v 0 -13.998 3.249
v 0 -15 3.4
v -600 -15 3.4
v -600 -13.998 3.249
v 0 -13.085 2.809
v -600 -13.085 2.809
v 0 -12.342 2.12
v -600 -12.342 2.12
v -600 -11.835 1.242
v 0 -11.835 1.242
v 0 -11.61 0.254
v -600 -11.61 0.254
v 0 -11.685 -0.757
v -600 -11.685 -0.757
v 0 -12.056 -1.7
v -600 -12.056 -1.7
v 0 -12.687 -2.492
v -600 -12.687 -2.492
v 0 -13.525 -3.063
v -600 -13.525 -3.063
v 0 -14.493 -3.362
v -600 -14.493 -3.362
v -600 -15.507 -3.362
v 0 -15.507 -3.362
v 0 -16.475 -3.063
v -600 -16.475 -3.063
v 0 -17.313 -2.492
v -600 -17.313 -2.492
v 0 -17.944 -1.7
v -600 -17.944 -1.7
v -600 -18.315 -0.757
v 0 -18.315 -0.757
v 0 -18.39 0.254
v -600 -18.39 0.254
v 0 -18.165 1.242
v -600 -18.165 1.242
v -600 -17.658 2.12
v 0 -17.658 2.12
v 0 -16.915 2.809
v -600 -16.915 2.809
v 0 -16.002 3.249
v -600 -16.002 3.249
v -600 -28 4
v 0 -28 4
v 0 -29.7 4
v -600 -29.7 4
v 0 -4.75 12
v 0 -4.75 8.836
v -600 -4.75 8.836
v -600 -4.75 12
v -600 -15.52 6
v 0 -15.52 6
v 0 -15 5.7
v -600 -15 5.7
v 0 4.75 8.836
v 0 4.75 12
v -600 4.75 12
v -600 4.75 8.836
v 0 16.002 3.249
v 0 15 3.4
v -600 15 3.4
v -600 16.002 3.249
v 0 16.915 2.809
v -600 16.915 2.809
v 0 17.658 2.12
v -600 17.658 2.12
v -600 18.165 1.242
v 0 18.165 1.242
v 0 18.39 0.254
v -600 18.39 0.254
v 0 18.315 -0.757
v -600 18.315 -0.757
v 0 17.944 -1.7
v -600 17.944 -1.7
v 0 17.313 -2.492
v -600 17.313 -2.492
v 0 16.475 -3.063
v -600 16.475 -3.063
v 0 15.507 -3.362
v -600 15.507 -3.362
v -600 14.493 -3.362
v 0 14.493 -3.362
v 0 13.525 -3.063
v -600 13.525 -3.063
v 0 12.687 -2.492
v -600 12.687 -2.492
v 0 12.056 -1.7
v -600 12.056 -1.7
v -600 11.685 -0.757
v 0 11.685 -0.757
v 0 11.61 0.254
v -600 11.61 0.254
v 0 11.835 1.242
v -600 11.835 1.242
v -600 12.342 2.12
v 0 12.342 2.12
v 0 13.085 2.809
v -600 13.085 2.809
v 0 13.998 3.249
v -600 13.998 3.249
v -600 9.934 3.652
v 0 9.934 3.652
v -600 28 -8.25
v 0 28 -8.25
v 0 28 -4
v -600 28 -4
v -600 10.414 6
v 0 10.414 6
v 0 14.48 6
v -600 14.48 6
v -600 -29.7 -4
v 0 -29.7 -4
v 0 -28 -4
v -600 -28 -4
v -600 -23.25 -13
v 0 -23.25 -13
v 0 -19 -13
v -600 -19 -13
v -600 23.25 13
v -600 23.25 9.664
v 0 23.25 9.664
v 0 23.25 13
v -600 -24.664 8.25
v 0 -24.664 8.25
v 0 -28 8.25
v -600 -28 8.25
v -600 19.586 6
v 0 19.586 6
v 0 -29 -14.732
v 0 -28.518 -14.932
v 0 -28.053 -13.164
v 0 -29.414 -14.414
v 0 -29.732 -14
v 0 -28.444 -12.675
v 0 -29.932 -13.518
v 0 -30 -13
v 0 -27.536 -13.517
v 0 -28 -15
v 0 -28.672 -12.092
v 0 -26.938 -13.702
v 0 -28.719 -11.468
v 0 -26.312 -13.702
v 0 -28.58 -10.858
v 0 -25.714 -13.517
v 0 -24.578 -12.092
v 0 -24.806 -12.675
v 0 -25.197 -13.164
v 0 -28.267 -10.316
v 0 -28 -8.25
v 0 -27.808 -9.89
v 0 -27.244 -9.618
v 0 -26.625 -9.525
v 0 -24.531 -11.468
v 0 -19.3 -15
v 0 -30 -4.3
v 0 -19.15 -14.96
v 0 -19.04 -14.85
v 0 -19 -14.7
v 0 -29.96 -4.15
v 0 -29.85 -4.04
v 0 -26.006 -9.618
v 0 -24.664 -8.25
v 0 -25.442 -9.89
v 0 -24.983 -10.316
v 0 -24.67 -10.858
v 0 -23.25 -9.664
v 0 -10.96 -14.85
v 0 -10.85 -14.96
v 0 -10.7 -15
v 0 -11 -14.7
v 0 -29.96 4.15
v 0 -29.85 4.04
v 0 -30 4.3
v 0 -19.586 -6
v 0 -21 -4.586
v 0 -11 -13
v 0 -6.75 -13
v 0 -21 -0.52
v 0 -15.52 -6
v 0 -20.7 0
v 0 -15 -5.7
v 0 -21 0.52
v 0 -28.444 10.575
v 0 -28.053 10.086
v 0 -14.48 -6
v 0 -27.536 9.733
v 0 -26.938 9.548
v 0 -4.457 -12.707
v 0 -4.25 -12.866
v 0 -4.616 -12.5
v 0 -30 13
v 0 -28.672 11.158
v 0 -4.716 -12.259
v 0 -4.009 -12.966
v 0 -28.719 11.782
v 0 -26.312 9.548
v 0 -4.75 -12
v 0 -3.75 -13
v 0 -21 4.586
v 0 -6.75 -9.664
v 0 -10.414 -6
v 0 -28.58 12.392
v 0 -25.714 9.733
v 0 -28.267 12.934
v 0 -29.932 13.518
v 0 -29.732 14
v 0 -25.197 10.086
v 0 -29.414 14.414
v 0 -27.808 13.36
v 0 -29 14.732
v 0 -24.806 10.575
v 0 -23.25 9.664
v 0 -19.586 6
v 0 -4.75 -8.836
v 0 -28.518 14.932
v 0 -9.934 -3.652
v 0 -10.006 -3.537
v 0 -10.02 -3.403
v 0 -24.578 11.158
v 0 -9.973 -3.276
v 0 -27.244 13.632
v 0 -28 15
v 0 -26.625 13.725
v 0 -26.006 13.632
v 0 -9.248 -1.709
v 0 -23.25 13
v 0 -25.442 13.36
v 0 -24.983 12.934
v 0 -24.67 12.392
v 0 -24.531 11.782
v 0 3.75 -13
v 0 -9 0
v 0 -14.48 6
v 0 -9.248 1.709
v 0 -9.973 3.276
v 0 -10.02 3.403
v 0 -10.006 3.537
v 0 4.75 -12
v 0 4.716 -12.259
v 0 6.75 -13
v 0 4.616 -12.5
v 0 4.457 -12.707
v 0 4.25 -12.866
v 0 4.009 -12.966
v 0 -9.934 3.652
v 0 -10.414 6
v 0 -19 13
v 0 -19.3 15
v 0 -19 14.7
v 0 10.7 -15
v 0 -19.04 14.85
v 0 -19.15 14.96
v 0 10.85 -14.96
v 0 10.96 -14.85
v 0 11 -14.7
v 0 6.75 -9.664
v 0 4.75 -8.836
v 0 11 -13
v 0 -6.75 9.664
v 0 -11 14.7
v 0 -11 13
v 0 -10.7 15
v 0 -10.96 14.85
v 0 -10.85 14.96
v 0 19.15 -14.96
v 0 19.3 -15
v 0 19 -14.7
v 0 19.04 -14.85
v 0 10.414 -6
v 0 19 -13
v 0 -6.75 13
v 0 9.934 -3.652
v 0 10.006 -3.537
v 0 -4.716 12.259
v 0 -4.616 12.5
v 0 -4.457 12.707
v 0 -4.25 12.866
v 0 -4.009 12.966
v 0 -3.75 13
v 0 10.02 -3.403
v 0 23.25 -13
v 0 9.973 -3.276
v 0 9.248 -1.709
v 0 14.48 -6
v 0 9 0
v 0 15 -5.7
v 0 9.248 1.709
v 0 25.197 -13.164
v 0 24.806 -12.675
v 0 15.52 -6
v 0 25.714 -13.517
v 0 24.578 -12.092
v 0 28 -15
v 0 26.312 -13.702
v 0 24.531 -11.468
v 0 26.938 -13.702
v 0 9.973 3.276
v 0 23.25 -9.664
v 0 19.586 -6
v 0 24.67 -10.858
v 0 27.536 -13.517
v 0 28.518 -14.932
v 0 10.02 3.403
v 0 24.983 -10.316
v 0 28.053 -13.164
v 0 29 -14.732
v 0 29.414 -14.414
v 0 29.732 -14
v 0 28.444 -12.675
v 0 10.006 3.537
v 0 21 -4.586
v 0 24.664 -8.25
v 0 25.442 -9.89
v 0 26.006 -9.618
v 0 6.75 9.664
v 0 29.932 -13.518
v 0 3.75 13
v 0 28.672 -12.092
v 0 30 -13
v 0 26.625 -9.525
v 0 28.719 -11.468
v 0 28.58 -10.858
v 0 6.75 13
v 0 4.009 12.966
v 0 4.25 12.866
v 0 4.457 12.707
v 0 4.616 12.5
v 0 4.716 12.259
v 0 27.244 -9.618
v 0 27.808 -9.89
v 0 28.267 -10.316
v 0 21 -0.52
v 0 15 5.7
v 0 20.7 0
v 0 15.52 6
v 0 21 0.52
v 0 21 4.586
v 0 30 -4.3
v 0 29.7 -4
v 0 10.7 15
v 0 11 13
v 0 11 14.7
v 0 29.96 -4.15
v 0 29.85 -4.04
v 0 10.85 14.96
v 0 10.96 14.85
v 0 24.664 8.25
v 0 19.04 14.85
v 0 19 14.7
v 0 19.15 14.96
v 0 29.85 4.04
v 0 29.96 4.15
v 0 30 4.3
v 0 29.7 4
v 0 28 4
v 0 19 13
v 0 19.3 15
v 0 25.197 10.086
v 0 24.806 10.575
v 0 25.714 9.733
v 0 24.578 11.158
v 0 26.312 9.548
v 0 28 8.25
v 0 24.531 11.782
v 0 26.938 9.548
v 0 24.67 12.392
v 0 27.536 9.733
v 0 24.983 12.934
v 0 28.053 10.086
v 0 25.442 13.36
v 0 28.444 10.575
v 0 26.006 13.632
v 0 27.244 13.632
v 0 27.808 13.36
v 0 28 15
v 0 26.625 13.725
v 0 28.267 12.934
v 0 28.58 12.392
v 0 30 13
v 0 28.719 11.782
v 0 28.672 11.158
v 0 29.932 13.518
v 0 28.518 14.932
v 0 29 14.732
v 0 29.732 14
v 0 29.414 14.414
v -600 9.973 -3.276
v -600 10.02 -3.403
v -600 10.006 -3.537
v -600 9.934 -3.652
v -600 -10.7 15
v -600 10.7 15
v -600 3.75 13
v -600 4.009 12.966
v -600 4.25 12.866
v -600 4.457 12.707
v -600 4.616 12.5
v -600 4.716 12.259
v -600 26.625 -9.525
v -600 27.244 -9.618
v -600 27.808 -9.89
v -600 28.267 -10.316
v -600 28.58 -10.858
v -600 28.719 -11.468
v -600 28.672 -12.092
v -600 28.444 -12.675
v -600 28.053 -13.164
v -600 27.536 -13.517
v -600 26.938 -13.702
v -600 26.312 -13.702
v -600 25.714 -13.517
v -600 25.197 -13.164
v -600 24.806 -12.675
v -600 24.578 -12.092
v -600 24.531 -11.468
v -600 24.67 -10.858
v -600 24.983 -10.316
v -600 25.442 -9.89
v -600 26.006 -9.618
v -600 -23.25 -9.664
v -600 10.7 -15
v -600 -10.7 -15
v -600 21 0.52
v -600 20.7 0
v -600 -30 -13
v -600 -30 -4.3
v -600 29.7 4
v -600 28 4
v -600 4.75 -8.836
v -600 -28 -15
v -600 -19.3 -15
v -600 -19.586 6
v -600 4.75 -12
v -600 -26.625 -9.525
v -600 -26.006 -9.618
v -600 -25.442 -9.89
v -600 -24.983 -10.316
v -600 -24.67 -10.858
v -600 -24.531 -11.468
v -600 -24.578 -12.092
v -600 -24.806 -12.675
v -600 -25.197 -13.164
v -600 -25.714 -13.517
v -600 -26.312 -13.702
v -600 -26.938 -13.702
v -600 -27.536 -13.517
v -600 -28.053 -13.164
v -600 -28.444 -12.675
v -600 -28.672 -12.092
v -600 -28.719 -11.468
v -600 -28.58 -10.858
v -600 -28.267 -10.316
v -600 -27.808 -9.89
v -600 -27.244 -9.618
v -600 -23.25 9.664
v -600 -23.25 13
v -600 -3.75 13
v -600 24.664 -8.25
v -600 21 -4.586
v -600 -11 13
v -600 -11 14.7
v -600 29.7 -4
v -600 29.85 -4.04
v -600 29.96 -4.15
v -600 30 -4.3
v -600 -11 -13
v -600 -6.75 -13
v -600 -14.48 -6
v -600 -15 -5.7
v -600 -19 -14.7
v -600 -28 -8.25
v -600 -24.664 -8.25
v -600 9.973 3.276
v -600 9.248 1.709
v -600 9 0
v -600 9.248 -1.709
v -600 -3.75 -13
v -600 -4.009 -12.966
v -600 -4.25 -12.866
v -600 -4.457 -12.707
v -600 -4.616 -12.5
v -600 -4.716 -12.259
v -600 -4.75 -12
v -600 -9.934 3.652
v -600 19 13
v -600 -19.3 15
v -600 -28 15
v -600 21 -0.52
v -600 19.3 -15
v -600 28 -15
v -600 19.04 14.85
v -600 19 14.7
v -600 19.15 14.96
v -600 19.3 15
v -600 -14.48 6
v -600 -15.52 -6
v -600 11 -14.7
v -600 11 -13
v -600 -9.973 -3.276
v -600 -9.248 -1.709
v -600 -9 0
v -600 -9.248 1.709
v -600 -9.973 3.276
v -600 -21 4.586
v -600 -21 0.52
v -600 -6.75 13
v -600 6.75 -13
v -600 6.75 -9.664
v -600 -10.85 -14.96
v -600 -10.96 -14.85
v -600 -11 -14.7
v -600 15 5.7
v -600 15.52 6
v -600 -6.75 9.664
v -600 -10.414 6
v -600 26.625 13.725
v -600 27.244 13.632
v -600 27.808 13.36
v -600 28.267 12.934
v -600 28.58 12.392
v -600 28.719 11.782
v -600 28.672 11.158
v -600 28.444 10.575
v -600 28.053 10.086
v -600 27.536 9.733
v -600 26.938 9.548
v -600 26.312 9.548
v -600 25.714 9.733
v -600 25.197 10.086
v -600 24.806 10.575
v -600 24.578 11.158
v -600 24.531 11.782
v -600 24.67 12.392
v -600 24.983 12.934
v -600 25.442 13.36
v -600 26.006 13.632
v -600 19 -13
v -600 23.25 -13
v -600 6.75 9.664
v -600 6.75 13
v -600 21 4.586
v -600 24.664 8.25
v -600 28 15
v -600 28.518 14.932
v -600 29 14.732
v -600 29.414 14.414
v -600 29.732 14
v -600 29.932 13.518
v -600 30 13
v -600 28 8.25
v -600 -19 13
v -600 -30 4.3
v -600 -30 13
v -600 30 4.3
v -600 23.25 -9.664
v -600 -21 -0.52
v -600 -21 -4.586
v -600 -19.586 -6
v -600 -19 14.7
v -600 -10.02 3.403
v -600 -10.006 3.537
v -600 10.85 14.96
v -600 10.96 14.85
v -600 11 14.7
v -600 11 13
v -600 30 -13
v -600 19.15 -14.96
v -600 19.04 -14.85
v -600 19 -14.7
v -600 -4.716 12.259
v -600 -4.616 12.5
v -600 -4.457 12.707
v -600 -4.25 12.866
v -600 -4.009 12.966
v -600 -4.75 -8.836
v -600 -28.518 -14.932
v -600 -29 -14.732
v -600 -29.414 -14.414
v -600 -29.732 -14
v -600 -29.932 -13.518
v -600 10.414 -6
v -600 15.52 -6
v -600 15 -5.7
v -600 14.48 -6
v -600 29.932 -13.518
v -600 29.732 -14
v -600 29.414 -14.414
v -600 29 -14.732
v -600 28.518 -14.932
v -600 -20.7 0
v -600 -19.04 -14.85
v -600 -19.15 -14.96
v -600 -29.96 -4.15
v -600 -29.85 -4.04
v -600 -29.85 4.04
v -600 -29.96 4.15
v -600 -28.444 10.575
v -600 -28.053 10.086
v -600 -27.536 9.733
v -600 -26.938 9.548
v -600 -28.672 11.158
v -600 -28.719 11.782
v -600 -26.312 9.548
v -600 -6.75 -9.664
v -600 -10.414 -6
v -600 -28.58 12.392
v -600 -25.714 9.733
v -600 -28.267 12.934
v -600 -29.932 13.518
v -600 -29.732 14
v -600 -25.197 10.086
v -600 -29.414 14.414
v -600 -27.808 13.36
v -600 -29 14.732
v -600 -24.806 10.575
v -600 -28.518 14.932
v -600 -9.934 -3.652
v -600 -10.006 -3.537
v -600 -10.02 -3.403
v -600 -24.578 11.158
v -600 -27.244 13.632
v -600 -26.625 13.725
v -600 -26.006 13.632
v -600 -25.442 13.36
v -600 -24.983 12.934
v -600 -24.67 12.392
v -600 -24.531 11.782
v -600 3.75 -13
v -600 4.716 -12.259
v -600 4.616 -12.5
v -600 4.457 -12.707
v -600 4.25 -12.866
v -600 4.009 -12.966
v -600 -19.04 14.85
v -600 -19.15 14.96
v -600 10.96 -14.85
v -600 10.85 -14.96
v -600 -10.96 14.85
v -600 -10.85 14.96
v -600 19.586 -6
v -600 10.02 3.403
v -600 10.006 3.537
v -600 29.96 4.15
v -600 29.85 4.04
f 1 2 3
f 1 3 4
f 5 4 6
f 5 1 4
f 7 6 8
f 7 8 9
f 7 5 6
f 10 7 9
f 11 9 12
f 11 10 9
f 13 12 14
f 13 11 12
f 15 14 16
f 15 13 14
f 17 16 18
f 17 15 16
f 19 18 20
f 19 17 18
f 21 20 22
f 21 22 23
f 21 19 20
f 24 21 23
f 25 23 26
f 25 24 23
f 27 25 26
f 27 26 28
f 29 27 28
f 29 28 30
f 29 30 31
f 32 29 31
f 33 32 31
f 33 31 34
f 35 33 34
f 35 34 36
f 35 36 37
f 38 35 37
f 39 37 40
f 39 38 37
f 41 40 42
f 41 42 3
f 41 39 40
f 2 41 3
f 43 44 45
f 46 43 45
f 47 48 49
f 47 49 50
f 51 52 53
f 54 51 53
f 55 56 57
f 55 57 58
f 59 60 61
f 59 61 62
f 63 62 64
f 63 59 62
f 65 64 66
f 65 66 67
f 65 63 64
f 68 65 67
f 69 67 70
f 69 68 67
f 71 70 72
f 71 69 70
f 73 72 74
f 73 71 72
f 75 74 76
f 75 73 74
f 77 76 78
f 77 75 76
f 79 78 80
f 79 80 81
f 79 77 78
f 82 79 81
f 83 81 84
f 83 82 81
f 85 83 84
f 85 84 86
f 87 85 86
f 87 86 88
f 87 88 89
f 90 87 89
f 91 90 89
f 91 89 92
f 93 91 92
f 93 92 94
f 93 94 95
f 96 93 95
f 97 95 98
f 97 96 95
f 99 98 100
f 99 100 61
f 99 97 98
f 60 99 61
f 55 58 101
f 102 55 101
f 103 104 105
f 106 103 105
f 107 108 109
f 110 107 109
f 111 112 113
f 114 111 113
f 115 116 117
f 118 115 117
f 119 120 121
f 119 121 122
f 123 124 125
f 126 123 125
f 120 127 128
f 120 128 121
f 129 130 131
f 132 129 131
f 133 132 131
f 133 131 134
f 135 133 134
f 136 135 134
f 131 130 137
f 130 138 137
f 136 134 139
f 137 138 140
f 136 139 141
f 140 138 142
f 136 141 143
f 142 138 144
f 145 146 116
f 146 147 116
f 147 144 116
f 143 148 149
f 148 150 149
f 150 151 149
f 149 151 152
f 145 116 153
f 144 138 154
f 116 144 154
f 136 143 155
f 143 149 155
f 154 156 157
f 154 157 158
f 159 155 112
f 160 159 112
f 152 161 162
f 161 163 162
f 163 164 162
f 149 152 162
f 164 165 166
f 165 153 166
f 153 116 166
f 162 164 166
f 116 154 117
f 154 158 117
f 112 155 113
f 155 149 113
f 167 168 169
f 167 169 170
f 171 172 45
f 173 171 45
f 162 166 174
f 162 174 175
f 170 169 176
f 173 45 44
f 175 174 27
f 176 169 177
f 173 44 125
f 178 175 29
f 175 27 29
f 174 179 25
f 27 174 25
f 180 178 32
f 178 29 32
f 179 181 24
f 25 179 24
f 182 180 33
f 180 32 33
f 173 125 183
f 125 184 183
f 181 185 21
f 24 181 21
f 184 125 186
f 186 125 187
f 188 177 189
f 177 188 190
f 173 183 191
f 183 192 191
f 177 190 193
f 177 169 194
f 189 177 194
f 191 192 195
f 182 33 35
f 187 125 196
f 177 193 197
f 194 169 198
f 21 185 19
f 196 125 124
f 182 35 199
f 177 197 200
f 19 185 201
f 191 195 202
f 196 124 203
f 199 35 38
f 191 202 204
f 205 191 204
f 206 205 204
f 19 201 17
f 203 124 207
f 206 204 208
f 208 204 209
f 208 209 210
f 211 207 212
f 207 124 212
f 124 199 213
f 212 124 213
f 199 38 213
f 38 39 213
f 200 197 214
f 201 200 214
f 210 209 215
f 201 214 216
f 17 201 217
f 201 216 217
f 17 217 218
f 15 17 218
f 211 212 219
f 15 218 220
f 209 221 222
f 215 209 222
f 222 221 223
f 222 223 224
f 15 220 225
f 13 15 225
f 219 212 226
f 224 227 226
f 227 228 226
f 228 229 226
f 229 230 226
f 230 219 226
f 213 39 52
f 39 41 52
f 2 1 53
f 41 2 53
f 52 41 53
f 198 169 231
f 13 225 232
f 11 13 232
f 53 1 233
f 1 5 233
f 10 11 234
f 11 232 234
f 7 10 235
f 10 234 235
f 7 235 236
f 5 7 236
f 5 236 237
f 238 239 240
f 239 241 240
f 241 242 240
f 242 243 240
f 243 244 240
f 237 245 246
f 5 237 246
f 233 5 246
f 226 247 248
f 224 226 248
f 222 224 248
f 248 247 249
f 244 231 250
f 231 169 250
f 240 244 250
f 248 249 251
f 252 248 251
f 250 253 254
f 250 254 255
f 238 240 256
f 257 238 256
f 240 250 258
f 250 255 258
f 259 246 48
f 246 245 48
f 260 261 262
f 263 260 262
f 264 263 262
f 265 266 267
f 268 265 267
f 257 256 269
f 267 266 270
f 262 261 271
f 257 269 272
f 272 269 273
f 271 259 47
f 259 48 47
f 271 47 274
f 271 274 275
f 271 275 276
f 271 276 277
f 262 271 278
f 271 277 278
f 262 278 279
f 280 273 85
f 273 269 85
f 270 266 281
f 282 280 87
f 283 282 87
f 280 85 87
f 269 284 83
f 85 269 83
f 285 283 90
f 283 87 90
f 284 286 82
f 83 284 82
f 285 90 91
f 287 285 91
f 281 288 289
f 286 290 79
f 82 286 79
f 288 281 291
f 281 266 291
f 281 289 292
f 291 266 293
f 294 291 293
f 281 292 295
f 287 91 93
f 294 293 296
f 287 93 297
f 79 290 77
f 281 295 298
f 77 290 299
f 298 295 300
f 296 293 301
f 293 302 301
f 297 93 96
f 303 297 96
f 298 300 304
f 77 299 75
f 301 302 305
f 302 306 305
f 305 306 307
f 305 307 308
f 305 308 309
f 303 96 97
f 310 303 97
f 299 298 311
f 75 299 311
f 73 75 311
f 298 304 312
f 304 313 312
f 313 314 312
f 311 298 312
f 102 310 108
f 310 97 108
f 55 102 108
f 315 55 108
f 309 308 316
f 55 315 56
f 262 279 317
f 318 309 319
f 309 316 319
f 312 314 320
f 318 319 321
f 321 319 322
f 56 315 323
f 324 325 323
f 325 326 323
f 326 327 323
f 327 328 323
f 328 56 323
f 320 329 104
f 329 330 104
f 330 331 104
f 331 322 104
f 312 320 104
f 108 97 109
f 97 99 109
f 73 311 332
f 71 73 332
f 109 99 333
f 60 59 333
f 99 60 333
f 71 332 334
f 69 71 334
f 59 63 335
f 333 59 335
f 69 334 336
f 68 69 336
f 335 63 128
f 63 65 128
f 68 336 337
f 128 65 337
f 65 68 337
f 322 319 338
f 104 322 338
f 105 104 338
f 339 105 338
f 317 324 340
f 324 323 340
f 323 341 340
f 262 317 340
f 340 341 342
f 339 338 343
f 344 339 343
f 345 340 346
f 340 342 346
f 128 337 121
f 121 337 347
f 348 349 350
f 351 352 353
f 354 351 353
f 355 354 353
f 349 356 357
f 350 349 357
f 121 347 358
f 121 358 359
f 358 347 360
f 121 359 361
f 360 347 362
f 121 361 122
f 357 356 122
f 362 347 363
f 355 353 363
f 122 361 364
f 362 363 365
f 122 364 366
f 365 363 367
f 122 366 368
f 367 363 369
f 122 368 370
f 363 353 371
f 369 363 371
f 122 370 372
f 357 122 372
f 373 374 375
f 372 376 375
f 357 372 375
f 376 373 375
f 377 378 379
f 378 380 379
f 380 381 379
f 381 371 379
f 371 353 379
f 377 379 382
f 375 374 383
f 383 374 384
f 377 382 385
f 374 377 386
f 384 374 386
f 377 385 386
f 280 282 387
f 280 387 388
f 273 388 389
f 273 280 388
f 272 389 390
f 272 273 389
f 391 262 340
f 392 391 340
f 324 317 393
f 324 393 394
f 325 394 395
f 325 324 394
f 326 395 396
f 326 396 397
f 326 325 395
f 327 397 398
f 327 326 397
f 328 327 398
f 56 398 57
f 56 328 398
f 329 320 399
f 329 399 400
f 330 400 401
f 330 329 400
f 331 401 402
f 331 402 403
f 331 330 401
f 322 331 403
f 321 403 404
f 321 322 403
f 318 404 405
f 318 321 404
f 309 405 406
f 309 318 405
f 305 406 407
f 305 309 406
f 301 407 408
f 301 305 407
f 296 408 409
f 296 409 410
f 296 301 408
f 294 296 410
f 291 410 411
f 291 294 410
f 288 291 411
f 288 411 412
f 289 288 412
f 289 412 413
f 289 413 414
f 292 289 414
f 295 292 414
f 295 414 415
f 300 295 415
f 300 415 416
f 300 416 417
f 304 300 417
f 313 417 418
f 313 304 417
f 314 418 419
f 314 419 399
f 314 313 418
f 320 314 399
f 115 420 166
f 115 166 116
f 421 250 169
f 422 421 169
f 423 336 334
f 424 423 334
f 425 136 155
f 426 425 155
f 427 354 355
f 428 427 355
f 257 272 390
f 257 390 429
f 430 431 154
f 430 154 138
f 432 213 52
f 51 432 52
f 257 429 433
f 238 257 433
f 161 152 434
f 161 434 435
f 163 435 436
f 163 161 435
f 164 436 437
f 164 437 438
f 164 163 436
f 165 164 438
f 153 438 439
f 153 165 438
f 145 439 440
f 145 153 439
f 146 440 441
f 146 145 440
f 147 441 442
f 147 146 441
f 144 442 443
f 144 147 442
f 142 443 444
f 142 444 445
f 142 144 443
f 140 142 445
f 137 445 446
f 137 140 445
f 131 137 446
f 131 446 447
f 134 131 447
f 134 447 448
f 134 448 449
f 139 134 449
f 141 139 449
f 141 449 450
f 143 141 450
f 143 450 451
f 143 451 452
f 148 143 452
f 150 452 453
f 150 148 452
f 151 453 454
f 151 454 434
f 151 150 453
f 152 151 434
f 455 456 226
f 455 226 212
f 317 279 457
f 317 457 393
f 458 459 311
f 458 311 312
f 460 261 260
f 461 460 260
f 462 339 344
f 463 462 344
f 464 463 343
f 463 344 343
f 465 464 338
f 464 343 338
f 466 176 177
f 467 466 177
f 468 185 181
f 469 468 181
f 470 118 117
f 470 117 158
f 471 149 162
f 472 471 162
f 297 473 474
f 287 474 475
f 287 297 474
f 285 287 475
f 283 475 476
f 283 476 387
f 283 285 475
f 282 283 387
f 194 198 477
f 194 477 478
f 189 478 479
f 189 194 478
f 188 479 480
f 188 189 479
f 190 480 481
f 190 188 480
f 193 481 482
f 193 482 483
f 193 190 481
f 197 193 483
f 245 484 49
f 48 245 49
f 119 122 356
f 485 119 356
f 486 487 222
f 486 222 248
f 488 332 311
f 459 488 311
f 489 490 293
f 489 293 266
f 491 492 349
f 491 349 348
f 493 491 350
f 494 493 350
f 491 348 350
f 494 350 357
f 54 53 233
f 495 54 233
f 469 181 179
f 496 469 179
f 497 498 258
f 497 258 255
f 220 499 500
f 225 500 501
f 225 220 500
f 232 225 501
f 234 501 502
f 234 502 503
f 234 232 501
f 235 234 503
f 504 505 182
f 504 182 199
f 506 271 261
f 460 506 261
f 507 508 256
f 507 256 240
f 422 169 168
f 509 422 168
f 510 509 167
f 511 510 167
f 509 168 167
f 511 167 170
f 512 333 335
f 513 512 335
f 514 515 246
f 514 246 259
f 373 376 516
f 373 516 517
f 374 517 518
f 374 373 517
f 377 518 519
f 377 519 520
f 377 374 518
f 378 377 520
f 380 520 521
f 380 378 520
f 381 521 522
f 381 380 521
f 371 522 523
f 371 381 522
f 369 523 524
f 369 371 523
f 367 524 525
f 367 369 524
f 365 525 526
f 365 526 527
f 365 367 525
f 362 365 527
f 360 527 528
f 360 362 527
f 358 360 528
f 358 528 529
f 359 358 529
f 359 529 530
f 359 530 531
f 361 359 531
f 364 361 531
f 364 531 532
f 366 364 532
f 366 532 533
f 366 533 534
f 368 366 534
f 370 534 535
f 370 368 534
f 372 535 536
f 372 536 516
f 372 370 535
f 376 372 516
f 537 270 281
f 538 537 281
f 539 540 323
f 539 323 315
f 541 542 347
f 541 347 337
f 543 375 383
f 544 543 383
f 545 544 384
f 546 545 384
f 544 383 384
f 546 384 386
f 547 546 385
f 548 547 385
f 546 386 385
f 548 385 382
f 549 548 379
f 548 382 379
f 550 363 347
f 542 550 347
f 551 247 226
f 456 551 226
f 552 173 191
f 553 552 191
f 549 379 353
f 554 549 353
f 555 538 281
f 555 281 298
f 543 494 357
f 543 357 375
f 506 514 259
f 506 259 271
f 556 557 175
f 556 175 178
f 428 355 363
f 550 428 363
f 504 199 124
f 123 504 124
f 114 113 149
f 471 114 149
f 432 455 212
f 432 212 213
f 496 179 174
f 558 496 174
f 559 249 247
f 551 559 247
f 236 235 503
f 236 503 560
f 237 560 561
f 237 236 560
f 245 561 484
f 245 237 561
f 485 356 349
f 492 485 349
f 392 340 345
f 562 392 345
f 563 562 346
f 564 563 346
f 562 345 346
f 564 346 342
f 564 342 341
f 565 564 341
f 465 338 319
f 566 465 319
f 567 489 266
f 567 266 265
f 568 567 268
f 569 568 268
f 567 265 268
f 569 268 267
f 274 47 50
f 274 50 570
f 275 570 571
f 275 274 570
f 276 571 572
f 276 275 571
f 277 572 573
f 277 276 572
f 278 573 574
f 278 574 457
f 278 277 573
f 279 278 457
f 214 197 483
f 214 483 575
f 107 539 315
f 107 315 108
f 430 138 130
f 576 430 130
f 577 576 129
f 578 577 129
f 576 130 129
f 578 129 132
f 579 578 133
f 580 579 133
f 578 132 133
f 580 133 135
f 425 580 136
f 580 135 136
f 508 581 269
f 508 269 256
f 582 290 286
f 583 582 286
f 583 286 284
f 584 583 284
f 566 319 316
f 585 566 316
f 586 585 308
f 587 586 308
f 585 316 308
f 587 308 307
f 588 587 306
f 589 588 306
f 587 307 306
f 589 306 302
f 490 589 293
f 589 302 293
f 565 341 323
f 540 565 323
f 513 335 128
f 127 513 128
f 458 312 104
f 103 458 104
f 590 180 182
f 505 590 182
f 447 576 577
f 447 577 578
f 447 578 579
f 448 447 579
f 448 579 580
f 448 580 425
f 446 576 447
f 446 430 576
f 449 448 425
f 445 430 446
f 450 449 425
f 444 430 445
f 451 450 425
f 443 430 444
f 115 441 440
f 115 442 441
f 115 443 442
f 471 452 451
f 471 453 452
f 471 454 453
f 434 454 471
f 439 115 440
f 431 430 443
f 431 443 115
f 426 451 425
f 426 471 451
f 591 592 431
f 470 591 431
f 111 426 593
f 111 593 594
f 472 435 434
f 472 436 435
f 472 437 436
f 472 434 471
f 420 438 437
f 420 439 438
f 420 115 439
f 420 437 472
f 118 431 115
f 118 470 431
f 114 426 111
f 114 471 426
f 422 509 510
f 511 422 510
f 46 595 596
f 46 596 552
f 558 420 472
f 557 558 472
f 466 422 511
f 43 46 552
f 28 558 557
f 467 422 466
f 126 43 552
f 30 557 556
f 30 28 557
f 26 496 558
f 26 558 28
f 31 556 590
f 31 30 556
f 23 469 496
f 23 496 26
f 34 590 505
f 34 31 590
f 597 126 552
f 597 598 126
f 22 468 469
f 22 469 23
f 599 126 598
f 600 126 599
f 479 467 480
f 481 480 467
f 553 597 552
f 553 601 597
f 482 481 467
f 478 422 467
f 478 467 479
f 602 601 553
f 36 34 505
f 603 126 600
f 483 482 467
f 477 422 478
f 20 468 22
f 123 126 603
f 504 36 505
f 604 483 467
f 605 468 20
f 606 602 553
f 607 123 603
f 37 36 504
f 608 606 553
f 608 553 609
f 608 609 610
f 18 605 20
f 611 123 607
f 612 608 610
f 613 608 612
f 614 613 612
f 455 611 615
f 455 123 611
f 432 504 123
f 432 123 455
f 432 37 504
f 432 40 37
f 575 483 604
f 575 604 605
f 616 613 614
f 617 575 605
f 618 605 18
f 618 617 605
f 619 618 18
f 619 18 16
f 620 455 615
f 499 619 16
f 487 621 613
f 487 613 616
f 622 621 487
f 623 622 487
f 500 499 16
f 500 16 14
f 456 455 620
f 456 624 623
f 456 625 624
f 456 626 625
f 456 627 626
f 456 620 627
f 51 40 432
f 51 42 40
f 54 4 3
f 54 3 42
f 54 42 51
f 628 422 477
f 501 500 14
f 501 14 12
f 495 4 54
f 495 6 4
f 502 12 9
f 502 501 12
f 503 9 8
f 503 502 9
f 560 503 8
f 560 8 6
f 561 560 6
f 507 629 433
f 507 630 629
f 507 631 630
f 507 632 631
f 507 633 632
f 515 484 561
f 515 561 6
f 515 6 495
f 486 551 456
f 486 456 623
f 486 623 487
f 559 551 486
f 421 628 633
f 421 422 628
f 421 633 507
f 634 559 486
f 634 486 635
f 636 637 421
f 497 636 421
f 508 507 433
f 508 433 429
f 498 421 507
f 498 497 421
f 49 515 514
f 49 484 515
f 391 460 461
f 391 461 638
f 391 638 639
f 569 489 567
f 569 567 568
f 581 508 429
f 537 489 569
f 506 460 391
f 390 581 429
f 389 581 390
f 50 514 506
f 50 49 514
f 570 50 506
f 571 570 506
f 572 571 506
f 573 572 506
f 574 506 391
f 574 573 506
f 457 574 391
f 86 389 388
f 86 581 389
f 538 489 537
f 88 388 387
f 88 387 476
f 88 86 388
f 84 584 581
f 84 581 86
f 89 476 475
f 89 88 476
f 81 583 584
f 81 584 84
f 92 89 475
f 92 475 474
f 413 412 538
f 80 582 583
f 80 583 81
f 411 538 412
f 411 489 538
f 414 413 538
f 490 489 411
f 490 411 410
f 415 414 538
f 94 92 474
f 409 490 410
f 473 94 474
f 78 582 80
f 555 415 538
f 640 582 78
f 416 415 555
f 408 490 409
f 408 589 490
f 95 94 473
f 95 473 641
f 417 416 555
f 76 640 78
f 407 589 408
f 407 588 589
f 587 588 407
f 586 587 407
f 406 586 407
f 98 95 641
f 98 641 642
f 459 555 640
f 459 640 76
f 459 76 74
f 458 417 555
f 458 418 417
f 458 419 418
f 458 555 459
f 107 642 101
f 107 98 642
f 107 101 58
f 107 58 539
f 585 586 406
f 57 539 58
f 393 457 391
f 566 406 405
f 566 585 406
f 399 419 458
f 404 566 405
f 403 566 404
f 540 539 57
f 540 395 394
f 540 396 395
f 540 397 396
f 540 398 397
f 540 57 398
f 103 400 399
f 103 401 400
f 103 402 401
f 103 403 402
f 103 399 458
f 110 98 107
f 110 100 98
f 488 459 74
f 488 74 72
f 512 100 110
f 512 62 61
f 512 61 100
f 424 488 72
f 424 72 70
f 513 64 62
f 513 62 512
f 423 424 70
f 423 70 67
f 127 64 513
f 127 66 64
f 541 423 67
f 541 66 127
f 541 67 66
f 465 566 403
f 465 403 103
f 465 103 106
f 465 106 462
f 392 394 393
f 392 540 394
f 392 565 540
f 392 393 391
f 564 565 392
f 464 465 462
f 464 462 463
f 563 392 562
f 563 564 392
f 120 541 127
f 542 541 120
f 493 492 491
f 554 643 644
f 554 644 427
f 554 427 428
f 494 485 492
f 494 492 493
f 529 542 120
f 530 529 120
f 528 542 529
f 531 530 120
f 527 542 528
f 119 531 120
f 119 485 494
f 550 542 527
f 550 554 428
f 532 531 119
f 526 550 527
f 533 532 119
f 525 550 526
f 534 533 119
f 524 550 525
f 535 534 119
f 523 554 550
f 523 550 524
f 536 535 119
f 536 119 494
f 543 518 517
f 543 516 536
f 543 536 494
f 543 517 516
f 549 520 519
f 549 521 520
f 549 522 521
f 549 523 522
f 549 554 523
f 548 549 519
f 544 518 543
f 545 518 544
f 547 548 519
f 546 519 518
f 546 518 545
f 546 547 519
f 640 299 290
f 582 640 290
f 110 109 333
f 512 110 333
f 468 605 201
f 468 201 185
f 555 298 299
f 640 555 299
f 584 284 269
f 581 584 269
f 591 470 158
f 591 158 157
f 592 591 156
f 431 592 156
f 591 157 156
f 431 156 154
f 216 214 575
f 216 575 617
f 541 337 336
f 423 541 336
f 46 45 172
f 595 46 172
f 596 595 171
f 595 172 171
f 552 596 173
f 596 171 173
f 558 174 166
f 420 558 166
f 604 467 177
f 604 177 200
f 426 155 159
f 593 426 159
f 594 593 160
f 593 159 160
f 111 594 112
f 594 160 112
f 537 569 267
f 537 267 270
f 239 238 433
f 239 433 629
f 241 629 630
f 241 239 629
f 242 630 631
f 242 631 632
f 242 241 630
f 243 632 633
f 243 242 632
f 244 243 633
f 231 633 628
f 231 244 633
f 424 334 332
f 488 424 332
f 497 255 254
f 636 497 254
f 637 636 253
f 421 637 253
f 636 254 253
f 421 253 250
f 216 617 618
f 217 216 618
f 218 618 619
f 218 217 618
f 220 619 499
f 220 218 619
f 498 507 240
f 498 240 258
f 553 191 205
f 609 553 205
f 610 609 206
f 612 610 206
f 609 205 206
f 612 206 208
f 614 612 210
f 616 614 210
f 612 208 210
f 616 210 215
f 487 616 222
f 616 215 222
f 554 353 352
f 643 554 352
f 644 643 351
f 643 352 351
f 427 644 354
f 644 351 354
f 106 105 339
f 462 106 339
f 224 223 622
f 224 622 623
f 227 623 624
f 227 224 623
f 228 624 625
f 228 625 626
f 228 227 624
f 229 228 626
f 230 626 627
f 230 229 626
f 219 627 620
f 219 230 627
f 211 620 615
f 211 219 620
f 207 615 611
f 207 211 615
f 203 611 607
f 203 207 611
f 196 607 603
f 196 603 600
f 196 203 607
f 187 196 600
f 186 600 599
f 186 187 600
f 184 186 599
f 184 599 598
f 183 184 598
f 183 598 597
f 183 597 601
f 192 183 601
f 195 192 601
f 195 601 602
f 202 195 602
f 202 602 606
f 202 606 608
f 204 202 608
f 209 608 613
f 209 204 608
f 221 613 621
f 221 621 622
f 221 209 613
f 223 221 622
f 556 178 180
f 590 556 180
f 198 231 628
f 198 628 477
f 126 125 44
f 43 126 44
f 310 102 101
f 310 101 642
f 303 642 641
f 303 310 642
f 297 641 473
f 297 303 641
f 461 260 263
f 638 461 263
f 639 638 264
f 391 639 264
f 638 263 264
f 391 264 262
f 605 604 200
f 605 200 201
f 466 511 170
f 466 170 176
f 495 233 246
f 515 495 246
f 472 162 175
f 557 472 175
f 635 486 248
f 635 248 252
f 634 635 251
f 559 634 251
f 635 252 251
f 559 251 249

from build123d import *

# Parameters (mm, degrees)
SKETCH_1_R              = 2.1
SKETCH_1_R_2            = 3.4
F_30XS6_30X60S6_1_DEPTH = 600


with BuildPart() as part:
    # 草图1 → 30xs6 30X60S6(1) (new body)
    with BuildSketch(Plane.ZY):
        with BuildLine():
            Line((-13, -30), (-4.3, -30))
            ThreePointArc((-4.3, -30), (-4.087867966, -29.912132034), (-4, -29.7))
            Line((-4, -29.7), (-4, -28))
            Line((-4, -28), (-8.249999995, -28))
            Line((-8.249999995, -28), (-8.249999995, -24.664213567))
            Line((-8.249999995, -24.664213567), (-4.585786428, -21))
            Line((-4.585786428, -21), (-0.519615237, -21))
            Line((-0.519615237, -21), (5e-09, -20.7))
            Line((5e-09, -20.7), (0.519615247, -21))
            Line((0.519615247, -21), (4.585786438, -21))
            Line((4.585786438, -21), (8.250000005, -24.664213567))
            Line((8.250000005, -24.664213567), (8.250000005, -28))
            Line((8.250000005, -28), (4, -28))
            Line((4, -28), (4, -29.7))
            ThreePointArc((4, -29.7), (4.087867966, -29.912132034), (4.3, -30))
            Line((4.3, -30), (13, -30))
            ThreePointArc((13, -30), (14.414213562, -29.414213562), (15, -28))
            Line((15, -28), (15, -19.3000023))
            ThreePointArc((15, -19.3000023), (14.912132034, -19.087870266), (14.7, -19.0000023))
            Line((14.7, -19.0000023), (13.000000005, -19.0000023))
            Line((13.000000005, -19.0000023), (13.000000005, -23.250000005))
            Line((13.000000005, -23.250000005), (9.664213567, -23.250000005))
            Line((9.664213567, -23.250000005), (6.000000005, -19.585786443))
            Line((6.000000005, -19.585786443), (6.000000005, -15.519615247))
            Line((6.000000005, -15.519615247), (5.700000005, -15.000000005))
            Line((5.700000005, -15.000000005), (6.000000005, -14.480384763))
            Line((6.000000005, -14.480384763), (6.000000005, -10.414213567))
            Line((6.000000005, -10.414213567), (9.664213567, -6.750000005))
            Line((9.664213567, -6.750000005), (13.000000005, -6.750000005))
            Line((13.000000005, -6.750000005), (13.000000005, -11.0000023))
            Line((13.000000005, -11.0000023), (14.7, -11.0000023))
            ThreePointArc((14.7, -11.0000023), (14.912132034, -10.912134335), (15, -10.7000023))
            Line((15, -10.7000023), (15, 10.7000023))
            ThreePointArc((15, 10.7000023), (14.912132034, 10.912134335), (14.7, 11.0000023))
            Line((14.7, 11.0000023), (13.000000005, 11.0000023))
            Line((13.000000005, 11.0000023), (13.000000005, 6.749999995))
            Line((13.000000005, 6.749999995), (9.664213567, 6.749999995))
            Line((9.664213567, 6.749999995), (6.000000005, 10.414213557))
            Line((6.000000005, 10.414213557), (6.000000005, 14.480384753))
            Line((6.000000005, 14.480384753), (5.700000005, 14.999999995))
            Line((5.700000005, 14.999999995), (6.000000005, 15.519615237))
            Line((6.000000005, 15.519615237), (6.000000005, 19.585786433))
            Line((6.000000005, 19.585786433), (9.664213567, 23.249999995))
            Line((9.664213567, 23.249999995), (13.000000005, 23.249999995))
            Line((13.000000005, 23.249999995), (13.000000005, 19.0000023))
            Line((13.000000005, 19.0000023), (14.7, 19.0000023))
            ThreePointArc((14.7, 19.0000023), (14.912132034, 19.087870266), (15, 19.3000023))
            Line((15, 19.3000023), (15, 28))
            ThreePointArc((15, 28), (14.414213562, 29.414213562), (13, 30))
            Line((13, 30), (4.3, 30))
            ThreePointArc((4.3, 30), (4.087867966, 29.912132034), (4, 29.7))
            Line((4, 29.7), (4, 28))
            Line((4, 28), (8.250000005, 28))
            Line((8.250000005, 28), (8.250000005, 24.664213557))
            Line((8.250000005, 24.664213557), (4.585786448, 21))
            Line((4.585786448, 21), (0.519615247, 21))
            Line((0.519615247, 21), (5e-09, 20.7))
            Line((5e-09, 20.7), (-0.519615237, 21))
            Line((-0.519615237, 21), (-4.585786438, 21))
            Line((-4.585786438, 21), (-8.249999995, 24.664213557))
            Line((-8.249999995, 24.664213557), (-8.249999995, 28))
            Line((-8.249999995, 28), (-4, 28))
            Line((-4, 28), (-4, 29.7))
            ThreePointArc((-4, 29.7), (-4.087867966, 29.912132034), (-4.3, 30))
            Line((-4.3, 30), (-13, 30))
            ThreePointArc((-13, 30), (-14.414213562, 29.414213562), (-15, 28))
            Line((-15, 28), (-15, 19.3000023))
            ThreePointArc((-15, 19.3000023), (-14.912132034, 19.087870266), (-14.7, 19.0000023))
            Line((-14.7, 19.0000023), (-12.999999995, 19.0000023))
            Line((-12.999999995, 19.0000023), (-12.999999995, 23.249999995))
            Line((-12.999999995, 23.249999995), (-9.664213557, 23.249999995))
            Line((-9.664213557, 23.249999995), (-5.999999995, 19.585786433))
            Line((-5.999999995, 19.585786433), (-5.999999995, 15.519615237))
            Line((-5.999999995, 15.519615237), (-5.699999995, 14.999999995))
            Line((-5.699999995, 14.999999995), (-5.999999995, 14.480384753))
            Line((-5.999999995, 14.480384753), (-5.999999995, 10.414213557))
            Line((-5.999999995, 10.414213557), (-9.664213557, 6.749999995))
            Line((-9.664213557, 6.749999995), (-12.999999995, 6.749999995))
            Line((-12.999999995, 6.749999995), (-12.999999995, 11.0000023))
            Line((-12.999999995, 11.0000023), (-14.7, 11.0000023))
            ThreePointArc((-14.7, 11.0000023), (-14.912132034, 10.912134335), (-15, 10.7000023))
            Line((-15, 10.7000023), (-15, -10.7000023))
            ThreePointArc((-15, -10.7000023), (-14.912132034, -10.912134335), (-14.7, -11.0000023))
            Line((-14.7, -11.0000023), (-12.999999995, -11.0000023))
            Line((-12.999999995, -11.0000023), (-12.999999995, -6.750000005))
            Line((-12.999999995, -6.750000005), (-9.664213557, -6.750000005))
            Line((-9.664213557, -6.750000005), (-5.999999995, -10.414213567))
            Line((-5.999999995, -10.414213567), (-5.999999995, -14.480384763))
            Line((-5.999999995, -14.480384763), (-5.699999995, -15.000000005))
            Line((-5.699999995, -15.000000005), (-5.999999995, -15.519615247))
            Line((-5.999999995, -15.519615247), (-5.999999995, -19.585786443))
            Line((-5.999999995, -19.585786443), (-9.664213557, -23.250000005))
            Line((-9.664213557, -23.250000005), (-12.999999995, -23.250000005))
            Line((-12.999999995, -23.250000005), (-12.999999995, -19.0000023))
            Line((-12.999999995, -19.0000023), (-14.7, -19.0000023))
            ThreePointArc((-14.7, -19.0000023), (-14.912132034, -19.087870266), (-15, -19.3000023))
            Line((-15, -19.3000023), (-15, -28))
            ThreePointArc((-15, -28), (-14.414213562, -29.414213562), (-13, -30))
        make_face()
        with Locations((11.625000005, 26.624999995)):
            Circle(SKETCH_1_R, mode=Mode.SUBTRACT)
        with Locations((11.625000005, -26.625000005)):
            Circle(SKETCH_1_R, mode=Mode.SUBTRACT)
        with Locations((4.55e-07, -15.00000049)):
            Circle(SKETCH_1_R_2, mode=Mode.SUBTRACT)
        with Locations((4.55e-07, 15.0000023)):
            Circle(SKETCH_1_R_2, mode=Mode.SUBTRACT)
        with Locations((-11.624999995, 26.624999995)):
            Circle(SKETCH_1_R, mode=Mode.SUBTRACT)
        with Locations((-11.624999995, -26.625000005)):
            Circle(SKETCH_1_R, mode=Mode.SUBTRACT)
        with BuildLine():
            Line((-12.999999995, 3.749999995), (-12.999999995, -3.750000005))
            ThreePointArc((-12.999999995, -3.750000005), (-12.707106776, -4.457106786), (-11.999999995, -4.750000005))
            Line((-11.999999995, -4.750000005), (-8.835786433, -4.750000005))
            Line((-8.835786433, -4.750000005), (-3.651790591, -9.933995846))
            ThreePointArc((-3.651790591, -9.933995846), (-3.470778838, -10.020245326), (-3.275865231, -9.973203714))
            ThreePointArc((-3.275865231, -9.973203714), (1.45e-07, -9.000002005), (3.275865622, -9.973203376))
            ThreePointArc((3.275865622, -9.973203376), (3.470779219, -10.02024497), (3.651790956, -9.933995491))
            Line((3.651790956, -9.933995491), (8.835786443, -4.750000005))
            Line((8.835786443, -4.750000005), (12.000000005, -4.750000005))
            ThreePointArc((12.000000005, -4.750000005), (12.707106786, -4.457106786), (13.000000005, -3.750000005))
            Line((13.000000005, -3.750000005), (13.000000005, 3.749999995))
            ThreePointArc((13.000000005, 3.749999995), (12.707106786, 4.457106776), (12.000000005, 4.749999995))
            Line((12.000000005, 4.749999995), (8.835786443, 4.749999995))
            Line((8.835786443, 4.749999995), (3.6517913, 9.933995138))
            ThreePointArc((3.6517913, 9.933995138), (3.470779584, 10.020244614), (3.275866001, 9.973203046))
            ThreePointArc((3.275866001, 9.973203046), (1.45e-07, 9.000001815), (-3.27586561, 9.973203384))
            ThreePointArc((-3.27586561, 9.973203384), (-3.470779203, 10.020244971), (-3.651790935, 9.933995493))
            Line((-3.651790935, 9.933995493), (-8.835786433, 4.749999995))
            Line((-8.835786433, 4.749999995), (-11.999999995, 4.749999995))
            ThreePointArc((-11.999999995, 4.749999995), (-12.707106776, 4.457106776), (-12.999999995, 3.749999995))
        make_face(mode=Mode.SUBTRACT)
    extrude(amount=F_30XS6_30X60S6_1_DEPTH)


solid = part.part
